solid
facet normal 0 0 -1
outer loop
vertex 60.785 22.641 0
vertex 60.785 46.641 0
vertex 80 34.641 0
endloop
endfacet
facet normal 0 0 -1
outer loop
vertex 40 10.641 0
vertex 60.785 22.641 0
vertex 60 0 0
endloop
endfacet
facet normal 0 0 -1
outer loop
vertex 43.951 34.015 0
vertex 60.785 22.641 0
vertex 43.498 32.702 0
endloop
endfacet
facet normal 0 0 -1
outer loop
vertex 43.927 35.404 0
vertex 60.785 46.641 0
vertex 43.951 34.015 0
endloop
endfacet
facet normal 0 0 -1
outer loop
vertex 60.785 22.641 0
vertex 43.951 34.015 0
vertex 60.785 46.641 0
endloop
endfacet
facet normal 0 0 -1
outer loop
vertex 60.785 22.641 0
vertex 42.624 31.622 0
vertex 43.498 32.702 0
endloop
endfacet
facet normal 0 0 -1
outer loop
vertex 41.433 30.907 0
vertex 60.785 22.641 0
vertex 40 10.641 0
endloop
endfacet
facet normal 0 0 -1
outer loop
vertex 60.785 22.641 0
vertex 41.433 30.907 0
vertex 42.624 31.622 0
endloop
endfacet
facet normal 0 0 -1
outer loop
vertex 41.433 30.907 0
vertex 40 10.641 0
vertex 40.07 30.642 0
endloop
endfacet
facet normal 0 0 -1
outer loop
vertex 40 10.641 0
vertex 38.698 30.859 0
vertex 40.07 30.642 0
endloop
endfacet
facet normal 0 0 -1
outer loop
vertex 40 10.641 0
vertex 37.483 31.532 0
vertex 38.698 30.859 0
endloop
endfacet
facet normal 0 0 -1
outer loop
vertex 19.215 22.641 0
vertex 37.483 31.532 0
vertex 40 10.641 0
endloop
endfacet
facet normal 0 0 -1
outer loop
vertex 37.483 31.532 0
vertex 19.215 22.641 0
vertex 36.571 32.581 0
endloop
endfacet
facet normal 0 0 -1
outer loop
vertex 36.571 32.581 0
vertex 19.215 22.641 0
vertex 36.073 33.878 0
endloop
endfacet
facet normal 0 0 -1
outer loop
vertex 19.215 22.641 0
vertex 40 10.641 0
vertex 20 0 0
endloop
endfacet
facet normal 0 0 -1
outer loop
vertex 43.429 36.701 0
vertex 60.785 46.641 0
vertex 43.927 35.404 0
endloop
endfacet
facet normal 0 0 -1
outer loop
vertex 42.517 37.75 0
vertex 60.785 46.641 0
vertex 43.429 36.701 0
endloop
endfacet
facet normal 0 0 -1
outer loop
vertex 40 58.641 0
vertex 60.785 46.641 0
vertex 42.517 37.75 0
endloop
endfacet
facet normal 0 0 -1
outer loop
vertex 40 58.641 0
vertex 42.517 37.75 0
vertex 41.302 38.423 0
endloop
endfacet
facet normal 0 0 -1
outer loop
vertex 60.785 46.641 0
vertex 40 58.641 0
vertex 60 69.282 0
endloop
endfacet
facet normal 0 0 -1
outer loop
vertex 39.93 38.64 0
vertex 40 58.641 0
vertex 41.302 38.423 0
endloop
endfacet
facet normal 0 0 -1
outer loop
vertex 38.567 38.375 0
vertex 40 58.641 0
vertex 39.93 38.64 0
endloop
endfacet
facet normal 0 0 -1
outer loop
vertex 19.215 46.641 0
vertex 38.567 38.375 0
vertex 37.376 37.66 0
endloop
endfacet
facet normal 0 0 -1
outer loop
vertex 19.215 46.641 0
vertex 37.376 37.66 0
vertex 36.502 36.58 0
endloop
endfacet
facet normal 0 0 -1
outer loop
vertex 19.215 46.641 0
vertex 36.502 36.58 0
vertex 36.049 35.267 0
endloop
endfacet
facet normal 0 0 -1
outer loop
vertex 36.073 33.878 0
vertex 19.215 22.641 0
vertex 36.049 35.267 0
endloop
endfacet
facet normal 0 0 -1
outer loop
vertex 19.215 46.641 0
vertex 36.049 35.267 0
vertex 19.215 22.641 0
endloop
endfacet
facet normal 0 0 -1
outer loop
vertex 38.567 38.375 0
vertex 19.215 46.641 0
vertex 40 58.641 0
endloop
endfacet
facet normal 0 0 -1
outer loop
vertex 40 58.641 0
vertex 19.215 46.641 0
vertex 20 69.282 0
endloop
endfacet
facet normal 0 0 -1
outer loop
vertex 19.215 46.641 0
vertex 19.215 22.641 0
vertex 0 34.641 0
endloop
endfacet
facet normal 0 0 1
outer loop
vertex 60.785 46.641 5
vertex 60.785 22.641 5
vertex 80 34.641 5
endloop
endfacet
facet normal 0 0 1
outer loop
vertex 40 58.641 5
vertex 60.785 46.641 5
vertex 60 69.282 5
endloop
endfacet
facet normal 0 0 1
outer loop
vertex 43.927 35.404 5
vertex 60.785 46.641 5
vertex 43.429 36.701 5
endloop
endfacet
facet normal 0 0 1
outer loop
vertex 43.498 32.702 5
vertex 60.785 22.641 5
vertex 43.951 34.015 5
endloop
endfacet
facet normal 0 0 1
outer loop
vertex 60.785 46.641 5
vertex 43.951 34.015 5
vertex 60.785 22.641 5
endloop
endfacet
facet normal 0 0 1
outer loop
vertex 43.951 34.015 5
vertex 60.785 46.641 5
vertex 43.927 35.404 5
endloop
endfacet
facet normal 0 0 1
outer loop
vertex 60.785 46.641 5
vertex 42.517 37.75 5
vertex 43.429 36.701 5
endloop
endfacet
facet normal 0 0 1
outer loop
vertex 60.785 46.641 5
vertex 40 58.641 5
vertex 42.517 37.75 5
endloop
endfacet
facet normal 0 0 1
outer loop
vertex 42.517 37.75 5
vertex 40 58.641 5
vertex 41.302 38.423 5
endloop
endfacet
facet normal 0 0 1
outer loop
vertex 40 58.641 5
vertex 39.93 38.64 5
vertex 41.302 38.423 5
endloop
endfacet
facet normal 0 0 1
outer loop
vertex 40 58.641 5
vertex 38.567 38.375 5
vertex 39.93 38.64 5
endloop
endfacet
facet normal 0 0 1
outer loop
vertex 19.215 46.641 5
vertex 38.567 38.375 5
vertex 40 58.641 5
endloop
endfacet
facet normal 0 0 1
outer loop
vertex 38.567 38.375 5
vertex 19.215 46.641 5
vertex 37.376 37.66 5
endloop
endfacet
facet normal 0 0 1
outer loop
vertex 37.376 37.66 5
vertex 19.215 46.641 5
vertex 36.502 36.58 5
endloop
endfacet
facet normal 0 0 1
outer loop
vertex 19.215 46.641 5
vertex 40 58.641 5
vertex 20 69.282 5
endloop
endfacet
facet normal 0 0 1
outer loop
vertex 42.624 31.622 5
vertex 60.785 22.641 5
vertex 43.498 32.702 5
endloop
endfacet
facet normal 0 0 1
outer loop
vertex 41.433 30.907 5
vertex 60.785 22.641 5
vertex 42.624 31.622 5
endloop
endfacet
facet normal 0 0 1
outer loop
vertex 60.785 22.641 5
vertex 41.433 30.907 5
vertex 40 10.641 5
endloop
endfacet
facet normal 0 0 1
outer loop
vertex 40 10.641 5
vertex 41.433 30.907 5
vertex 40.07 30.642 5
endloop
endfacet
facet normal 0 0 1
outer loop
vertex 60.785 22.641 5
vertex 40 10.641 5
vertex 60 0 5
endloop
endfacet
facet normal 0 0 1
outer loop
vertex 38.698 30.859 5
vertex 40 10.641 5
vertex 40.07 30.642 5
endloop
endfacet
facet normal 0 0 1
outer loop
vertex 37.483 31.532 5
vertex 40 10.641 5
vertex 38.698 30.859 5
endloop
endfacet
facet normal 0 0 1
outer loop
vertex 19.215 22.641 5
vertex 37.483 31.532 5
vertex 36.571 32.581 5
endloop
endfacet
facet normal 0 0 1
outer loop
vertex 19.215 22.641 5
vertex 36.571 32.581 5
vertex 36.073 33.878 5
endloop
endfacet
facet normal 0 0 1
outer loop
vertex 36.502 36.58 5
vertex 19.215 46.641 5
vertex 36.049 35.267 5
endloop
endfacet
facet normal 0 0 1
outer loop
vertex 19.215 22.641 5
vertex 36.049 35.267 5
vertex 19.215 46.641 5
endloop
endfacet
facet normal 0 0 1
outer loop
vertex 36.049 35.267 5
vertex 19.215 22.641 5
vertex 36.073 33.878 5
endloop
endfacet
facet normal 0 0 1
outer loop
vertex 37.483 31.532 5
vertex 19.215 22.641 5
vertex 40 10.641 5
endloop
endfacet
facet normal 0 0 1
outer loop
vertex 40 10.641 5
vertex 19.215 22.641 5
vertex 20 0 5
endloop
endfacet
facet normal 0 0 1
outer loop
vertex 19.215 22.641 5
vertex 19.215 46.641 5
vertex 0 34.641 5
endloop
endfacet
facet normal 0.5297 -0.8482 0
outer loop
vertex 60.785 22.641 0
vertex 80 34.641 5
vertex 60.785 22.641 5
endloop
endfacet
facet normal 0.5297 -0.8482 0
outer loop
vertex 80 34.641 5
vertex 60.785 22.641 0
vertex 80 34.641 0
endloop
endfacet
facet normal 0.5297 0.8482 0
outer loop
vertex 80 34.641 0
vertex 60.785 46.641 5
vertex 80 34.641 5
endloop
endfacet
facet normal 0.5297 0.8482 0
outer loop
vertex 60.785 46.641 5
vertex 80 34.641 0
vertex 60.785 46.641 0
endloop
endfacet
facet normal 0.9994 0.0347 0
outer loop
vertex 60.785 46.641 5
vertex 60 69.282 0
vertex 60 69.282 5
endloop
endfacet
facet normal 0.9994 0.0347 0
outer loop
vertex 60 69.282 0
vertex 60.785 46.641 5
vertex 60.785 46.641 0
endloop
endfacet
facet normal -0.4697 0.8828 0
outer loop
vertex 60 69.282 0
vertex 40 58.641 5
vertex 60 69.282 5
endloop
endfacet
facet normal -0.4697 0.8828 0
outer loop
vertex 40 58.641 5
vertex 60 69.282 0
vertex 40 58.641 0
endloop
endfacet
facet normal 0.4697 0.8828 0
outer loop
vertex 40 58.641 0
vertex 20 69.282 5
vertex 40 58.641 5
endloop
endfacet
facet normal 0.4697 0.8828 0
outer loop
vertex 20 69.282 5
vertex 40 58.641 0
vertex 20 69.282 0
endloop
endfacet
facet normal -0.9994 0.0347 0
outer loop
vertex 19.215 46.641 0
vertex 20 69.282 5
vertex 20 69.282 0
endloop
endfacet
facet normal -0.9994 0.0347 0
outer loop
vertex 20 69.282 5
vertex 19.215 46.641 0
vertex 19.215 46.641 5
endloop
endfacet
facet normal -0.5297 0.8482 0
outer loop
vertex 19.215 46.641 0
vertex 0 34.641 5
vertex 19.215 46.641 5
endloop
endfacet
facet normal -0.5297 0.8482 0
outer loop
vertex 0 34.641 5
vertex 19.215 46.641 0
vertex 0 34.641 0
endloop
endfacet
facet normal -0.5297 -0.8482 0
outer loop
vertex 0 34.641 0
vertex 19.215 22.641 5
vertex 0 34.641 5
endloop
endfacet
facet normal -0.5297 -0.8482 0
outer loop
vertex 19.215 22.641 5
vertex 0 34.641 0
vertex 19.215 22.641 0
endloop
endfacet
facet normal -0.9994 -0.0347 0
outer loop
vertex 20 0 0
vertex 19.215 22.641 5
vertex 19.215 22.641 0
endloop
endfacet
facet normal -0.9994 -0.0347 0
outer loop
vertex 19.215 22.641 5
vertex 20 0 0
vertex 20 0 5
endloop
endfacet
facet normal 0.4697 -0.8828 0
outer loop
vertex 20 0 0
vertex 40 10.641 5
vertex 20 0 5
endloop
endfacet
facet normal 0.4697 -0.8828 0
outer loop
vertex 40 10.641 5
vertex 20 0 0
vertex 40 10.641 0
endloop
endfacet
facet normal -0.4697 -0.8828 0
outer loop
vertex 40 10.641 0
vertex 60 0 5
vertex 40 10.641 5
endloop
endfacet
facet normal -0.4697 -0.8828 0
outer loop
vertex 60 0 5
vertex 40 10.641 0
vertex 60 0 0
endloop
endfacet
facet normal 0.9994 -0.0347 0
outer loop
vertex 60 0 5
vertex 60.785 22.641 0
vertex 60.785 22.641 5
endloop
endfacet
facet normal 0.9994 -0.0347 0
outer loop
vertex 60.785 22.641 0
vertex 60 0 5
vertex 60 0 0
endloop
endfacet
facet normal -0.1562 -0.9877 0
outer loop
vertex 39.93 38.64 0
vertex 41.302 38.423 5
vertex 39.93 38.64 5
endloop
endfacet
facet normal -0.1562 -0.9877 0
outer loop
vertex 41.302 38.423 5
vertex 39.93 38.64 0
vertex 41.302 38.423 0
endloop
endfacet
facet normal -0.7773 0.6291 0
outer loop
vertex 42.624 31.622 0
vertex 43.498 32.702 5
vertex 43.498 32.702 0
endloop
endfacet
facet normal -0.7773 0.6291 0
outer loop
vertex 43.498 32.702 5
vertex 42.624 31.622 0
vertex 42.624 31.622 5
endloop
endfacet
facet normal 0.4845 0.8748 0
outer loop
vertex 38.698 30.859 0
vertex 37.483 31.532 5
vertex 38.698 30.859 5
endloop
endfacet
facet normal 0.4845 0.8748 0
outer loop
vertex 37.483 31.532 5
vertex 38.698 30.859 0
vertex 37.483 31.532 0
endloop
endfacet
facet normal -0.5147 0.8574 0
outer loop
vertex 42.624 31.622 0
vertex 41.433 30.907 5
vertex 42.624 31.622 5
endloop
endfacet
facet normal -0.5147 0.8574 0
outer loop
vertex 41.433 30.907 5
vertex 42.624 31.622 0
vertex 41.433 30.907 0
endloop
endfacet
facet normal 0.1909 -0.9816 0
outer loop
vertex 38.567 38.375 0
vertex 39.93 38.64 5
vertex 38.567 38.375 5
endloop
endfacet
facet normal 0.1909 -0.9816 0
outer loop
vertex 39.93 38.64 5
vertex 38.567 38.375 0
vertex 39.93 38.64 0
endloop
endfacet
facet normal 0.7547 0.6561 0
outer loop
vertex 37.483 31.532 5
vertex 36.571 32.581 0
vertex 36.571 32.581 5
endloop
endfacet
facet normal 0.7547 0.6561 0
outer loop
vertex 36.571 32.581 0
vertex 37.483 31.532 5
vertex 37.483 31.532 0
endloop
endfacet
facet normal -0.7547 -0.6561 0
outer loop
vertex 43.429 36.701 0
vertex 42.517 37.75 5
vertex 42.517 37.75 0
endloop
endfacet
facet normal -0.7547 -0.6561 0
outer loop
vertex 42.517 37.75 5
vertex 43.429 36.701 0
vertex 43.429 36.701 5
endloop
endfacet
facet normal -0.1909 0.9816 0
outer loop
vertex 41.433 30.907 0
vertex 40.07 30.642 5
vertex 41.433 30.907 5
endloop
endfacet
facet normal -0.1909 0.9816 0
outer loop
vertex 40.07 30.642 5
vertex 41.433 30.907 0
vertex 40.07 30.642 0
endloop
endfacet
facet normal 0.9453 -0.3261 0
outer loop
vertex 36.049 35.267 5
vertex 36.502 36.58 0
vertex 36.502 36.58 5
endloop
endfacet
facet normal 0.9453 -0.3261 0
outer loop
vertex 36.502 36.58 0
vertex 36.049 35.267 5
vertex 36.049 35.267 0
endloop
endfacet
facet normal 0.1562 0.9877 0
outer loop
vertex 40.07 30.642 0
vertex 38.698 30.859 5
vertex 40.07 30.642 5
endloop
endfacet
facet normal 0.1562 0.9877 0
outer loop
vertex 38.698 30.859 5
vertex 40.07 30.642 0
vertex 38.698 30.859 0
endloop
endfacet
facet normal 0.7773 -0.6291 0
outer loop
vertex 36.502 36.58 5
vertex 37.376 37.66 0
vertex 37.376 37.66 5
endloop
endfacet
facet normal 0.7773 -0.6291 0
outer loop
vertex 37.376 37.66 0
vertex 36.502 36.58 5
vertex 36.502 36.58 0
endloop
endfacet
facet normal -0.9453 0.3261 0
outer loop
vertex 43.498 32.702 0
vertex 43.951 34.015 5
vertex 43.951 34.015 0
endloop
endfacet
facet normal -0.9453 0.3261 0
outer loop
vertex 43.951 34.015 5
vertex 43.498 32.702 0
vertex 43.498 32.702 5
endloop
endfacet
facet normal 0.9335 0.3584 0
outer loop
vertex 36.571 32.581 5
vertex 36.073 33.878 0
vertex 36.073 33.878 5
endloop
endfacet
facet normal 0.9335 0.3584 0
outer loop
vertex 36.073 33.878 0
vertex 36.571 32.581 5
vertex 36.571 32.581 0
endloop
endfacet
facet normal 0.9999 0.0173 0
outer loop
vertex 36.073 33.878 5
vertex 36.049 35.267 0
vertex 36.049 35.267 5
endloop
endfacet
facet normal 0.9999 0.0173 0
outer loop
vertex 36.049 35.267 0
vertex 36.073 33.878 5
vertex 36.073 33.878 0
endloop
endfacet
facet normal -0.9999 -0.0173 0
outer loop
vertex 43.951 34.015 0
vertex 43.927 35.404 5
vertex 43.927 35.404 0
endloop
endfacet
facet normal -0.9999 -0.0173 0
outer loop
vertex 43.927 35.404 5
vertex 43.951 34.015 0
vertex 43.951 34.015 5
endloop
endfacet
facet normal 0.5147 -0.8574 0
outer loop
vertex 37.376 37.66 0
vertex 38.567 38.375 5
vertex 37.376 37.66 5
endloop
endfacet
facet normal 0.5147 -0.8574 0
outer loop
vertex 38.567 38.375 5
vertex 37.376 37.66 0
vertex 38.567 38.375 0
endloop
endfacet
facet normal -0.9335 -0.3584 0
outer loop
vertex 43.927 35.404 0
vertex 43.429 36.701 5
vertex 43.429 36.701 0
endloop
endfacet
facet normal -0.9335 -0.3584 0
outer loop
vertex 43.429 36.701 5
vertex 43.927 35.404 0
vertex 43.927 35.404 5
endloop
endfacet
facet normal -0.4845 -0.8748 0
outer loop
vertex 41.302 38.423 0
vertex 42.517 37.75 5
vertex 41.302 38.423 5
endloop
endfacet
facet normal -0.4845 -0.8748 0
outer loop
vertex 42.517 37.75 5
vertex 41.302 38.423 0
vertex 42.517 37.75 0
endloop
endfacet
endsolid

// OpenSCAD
$fn = 32;

// ----------------------------------------------------------------------
// Star wheel: 6-point star, R40
// ----------------------------------------------------------------------

// --- parameters (mm) ---
n_points = 6;             // number of points / teeth
r_out = 40;               // tip radius
r_in = 24;                // root radius
bore_r = 4;               // centre bore radius
plate_t = 5;              // plate thickness, Z (extrusion height)
bore_d = 8;               // centre bore diameter

profile = [[80, 34.641], [60.785, 46.641], [60, 69.282], [40, 58.641], [20, 69.282], [19.215, 46.641], [0, 34.641], [19.215, 22.641], [20, 0], [40, 10.641], [60, 0], [60.785, 22.641]];  // primary outline, 12 points, counter clockwise
void_1 = [[43.927, 35.404], [43.429, 36.701], [42.517, 37.75], [41.302, 38.423], [39.93, 38.64], [38.567, 38.375], [37.376, 37.66], [36.502, 36.58], [36.049, 35.267], [36.073, 33.878], [36.571, 32.581], [37.483, 31.532], [38.698, 30.859], [40.07, 30.642], [41.433, 30.907], [42.624, 31.622], [43.498, 32.702], [43.951, 34.015]];  // centre bore, 18 points

// --- the one profile operation ---
difference() {
  linear_extrude(height = plate_t) polygon(points = profile);
  translate([0, 0, -1])
    linear_extrude(height = plate_t + 2) polygon(points = void_1);
}
